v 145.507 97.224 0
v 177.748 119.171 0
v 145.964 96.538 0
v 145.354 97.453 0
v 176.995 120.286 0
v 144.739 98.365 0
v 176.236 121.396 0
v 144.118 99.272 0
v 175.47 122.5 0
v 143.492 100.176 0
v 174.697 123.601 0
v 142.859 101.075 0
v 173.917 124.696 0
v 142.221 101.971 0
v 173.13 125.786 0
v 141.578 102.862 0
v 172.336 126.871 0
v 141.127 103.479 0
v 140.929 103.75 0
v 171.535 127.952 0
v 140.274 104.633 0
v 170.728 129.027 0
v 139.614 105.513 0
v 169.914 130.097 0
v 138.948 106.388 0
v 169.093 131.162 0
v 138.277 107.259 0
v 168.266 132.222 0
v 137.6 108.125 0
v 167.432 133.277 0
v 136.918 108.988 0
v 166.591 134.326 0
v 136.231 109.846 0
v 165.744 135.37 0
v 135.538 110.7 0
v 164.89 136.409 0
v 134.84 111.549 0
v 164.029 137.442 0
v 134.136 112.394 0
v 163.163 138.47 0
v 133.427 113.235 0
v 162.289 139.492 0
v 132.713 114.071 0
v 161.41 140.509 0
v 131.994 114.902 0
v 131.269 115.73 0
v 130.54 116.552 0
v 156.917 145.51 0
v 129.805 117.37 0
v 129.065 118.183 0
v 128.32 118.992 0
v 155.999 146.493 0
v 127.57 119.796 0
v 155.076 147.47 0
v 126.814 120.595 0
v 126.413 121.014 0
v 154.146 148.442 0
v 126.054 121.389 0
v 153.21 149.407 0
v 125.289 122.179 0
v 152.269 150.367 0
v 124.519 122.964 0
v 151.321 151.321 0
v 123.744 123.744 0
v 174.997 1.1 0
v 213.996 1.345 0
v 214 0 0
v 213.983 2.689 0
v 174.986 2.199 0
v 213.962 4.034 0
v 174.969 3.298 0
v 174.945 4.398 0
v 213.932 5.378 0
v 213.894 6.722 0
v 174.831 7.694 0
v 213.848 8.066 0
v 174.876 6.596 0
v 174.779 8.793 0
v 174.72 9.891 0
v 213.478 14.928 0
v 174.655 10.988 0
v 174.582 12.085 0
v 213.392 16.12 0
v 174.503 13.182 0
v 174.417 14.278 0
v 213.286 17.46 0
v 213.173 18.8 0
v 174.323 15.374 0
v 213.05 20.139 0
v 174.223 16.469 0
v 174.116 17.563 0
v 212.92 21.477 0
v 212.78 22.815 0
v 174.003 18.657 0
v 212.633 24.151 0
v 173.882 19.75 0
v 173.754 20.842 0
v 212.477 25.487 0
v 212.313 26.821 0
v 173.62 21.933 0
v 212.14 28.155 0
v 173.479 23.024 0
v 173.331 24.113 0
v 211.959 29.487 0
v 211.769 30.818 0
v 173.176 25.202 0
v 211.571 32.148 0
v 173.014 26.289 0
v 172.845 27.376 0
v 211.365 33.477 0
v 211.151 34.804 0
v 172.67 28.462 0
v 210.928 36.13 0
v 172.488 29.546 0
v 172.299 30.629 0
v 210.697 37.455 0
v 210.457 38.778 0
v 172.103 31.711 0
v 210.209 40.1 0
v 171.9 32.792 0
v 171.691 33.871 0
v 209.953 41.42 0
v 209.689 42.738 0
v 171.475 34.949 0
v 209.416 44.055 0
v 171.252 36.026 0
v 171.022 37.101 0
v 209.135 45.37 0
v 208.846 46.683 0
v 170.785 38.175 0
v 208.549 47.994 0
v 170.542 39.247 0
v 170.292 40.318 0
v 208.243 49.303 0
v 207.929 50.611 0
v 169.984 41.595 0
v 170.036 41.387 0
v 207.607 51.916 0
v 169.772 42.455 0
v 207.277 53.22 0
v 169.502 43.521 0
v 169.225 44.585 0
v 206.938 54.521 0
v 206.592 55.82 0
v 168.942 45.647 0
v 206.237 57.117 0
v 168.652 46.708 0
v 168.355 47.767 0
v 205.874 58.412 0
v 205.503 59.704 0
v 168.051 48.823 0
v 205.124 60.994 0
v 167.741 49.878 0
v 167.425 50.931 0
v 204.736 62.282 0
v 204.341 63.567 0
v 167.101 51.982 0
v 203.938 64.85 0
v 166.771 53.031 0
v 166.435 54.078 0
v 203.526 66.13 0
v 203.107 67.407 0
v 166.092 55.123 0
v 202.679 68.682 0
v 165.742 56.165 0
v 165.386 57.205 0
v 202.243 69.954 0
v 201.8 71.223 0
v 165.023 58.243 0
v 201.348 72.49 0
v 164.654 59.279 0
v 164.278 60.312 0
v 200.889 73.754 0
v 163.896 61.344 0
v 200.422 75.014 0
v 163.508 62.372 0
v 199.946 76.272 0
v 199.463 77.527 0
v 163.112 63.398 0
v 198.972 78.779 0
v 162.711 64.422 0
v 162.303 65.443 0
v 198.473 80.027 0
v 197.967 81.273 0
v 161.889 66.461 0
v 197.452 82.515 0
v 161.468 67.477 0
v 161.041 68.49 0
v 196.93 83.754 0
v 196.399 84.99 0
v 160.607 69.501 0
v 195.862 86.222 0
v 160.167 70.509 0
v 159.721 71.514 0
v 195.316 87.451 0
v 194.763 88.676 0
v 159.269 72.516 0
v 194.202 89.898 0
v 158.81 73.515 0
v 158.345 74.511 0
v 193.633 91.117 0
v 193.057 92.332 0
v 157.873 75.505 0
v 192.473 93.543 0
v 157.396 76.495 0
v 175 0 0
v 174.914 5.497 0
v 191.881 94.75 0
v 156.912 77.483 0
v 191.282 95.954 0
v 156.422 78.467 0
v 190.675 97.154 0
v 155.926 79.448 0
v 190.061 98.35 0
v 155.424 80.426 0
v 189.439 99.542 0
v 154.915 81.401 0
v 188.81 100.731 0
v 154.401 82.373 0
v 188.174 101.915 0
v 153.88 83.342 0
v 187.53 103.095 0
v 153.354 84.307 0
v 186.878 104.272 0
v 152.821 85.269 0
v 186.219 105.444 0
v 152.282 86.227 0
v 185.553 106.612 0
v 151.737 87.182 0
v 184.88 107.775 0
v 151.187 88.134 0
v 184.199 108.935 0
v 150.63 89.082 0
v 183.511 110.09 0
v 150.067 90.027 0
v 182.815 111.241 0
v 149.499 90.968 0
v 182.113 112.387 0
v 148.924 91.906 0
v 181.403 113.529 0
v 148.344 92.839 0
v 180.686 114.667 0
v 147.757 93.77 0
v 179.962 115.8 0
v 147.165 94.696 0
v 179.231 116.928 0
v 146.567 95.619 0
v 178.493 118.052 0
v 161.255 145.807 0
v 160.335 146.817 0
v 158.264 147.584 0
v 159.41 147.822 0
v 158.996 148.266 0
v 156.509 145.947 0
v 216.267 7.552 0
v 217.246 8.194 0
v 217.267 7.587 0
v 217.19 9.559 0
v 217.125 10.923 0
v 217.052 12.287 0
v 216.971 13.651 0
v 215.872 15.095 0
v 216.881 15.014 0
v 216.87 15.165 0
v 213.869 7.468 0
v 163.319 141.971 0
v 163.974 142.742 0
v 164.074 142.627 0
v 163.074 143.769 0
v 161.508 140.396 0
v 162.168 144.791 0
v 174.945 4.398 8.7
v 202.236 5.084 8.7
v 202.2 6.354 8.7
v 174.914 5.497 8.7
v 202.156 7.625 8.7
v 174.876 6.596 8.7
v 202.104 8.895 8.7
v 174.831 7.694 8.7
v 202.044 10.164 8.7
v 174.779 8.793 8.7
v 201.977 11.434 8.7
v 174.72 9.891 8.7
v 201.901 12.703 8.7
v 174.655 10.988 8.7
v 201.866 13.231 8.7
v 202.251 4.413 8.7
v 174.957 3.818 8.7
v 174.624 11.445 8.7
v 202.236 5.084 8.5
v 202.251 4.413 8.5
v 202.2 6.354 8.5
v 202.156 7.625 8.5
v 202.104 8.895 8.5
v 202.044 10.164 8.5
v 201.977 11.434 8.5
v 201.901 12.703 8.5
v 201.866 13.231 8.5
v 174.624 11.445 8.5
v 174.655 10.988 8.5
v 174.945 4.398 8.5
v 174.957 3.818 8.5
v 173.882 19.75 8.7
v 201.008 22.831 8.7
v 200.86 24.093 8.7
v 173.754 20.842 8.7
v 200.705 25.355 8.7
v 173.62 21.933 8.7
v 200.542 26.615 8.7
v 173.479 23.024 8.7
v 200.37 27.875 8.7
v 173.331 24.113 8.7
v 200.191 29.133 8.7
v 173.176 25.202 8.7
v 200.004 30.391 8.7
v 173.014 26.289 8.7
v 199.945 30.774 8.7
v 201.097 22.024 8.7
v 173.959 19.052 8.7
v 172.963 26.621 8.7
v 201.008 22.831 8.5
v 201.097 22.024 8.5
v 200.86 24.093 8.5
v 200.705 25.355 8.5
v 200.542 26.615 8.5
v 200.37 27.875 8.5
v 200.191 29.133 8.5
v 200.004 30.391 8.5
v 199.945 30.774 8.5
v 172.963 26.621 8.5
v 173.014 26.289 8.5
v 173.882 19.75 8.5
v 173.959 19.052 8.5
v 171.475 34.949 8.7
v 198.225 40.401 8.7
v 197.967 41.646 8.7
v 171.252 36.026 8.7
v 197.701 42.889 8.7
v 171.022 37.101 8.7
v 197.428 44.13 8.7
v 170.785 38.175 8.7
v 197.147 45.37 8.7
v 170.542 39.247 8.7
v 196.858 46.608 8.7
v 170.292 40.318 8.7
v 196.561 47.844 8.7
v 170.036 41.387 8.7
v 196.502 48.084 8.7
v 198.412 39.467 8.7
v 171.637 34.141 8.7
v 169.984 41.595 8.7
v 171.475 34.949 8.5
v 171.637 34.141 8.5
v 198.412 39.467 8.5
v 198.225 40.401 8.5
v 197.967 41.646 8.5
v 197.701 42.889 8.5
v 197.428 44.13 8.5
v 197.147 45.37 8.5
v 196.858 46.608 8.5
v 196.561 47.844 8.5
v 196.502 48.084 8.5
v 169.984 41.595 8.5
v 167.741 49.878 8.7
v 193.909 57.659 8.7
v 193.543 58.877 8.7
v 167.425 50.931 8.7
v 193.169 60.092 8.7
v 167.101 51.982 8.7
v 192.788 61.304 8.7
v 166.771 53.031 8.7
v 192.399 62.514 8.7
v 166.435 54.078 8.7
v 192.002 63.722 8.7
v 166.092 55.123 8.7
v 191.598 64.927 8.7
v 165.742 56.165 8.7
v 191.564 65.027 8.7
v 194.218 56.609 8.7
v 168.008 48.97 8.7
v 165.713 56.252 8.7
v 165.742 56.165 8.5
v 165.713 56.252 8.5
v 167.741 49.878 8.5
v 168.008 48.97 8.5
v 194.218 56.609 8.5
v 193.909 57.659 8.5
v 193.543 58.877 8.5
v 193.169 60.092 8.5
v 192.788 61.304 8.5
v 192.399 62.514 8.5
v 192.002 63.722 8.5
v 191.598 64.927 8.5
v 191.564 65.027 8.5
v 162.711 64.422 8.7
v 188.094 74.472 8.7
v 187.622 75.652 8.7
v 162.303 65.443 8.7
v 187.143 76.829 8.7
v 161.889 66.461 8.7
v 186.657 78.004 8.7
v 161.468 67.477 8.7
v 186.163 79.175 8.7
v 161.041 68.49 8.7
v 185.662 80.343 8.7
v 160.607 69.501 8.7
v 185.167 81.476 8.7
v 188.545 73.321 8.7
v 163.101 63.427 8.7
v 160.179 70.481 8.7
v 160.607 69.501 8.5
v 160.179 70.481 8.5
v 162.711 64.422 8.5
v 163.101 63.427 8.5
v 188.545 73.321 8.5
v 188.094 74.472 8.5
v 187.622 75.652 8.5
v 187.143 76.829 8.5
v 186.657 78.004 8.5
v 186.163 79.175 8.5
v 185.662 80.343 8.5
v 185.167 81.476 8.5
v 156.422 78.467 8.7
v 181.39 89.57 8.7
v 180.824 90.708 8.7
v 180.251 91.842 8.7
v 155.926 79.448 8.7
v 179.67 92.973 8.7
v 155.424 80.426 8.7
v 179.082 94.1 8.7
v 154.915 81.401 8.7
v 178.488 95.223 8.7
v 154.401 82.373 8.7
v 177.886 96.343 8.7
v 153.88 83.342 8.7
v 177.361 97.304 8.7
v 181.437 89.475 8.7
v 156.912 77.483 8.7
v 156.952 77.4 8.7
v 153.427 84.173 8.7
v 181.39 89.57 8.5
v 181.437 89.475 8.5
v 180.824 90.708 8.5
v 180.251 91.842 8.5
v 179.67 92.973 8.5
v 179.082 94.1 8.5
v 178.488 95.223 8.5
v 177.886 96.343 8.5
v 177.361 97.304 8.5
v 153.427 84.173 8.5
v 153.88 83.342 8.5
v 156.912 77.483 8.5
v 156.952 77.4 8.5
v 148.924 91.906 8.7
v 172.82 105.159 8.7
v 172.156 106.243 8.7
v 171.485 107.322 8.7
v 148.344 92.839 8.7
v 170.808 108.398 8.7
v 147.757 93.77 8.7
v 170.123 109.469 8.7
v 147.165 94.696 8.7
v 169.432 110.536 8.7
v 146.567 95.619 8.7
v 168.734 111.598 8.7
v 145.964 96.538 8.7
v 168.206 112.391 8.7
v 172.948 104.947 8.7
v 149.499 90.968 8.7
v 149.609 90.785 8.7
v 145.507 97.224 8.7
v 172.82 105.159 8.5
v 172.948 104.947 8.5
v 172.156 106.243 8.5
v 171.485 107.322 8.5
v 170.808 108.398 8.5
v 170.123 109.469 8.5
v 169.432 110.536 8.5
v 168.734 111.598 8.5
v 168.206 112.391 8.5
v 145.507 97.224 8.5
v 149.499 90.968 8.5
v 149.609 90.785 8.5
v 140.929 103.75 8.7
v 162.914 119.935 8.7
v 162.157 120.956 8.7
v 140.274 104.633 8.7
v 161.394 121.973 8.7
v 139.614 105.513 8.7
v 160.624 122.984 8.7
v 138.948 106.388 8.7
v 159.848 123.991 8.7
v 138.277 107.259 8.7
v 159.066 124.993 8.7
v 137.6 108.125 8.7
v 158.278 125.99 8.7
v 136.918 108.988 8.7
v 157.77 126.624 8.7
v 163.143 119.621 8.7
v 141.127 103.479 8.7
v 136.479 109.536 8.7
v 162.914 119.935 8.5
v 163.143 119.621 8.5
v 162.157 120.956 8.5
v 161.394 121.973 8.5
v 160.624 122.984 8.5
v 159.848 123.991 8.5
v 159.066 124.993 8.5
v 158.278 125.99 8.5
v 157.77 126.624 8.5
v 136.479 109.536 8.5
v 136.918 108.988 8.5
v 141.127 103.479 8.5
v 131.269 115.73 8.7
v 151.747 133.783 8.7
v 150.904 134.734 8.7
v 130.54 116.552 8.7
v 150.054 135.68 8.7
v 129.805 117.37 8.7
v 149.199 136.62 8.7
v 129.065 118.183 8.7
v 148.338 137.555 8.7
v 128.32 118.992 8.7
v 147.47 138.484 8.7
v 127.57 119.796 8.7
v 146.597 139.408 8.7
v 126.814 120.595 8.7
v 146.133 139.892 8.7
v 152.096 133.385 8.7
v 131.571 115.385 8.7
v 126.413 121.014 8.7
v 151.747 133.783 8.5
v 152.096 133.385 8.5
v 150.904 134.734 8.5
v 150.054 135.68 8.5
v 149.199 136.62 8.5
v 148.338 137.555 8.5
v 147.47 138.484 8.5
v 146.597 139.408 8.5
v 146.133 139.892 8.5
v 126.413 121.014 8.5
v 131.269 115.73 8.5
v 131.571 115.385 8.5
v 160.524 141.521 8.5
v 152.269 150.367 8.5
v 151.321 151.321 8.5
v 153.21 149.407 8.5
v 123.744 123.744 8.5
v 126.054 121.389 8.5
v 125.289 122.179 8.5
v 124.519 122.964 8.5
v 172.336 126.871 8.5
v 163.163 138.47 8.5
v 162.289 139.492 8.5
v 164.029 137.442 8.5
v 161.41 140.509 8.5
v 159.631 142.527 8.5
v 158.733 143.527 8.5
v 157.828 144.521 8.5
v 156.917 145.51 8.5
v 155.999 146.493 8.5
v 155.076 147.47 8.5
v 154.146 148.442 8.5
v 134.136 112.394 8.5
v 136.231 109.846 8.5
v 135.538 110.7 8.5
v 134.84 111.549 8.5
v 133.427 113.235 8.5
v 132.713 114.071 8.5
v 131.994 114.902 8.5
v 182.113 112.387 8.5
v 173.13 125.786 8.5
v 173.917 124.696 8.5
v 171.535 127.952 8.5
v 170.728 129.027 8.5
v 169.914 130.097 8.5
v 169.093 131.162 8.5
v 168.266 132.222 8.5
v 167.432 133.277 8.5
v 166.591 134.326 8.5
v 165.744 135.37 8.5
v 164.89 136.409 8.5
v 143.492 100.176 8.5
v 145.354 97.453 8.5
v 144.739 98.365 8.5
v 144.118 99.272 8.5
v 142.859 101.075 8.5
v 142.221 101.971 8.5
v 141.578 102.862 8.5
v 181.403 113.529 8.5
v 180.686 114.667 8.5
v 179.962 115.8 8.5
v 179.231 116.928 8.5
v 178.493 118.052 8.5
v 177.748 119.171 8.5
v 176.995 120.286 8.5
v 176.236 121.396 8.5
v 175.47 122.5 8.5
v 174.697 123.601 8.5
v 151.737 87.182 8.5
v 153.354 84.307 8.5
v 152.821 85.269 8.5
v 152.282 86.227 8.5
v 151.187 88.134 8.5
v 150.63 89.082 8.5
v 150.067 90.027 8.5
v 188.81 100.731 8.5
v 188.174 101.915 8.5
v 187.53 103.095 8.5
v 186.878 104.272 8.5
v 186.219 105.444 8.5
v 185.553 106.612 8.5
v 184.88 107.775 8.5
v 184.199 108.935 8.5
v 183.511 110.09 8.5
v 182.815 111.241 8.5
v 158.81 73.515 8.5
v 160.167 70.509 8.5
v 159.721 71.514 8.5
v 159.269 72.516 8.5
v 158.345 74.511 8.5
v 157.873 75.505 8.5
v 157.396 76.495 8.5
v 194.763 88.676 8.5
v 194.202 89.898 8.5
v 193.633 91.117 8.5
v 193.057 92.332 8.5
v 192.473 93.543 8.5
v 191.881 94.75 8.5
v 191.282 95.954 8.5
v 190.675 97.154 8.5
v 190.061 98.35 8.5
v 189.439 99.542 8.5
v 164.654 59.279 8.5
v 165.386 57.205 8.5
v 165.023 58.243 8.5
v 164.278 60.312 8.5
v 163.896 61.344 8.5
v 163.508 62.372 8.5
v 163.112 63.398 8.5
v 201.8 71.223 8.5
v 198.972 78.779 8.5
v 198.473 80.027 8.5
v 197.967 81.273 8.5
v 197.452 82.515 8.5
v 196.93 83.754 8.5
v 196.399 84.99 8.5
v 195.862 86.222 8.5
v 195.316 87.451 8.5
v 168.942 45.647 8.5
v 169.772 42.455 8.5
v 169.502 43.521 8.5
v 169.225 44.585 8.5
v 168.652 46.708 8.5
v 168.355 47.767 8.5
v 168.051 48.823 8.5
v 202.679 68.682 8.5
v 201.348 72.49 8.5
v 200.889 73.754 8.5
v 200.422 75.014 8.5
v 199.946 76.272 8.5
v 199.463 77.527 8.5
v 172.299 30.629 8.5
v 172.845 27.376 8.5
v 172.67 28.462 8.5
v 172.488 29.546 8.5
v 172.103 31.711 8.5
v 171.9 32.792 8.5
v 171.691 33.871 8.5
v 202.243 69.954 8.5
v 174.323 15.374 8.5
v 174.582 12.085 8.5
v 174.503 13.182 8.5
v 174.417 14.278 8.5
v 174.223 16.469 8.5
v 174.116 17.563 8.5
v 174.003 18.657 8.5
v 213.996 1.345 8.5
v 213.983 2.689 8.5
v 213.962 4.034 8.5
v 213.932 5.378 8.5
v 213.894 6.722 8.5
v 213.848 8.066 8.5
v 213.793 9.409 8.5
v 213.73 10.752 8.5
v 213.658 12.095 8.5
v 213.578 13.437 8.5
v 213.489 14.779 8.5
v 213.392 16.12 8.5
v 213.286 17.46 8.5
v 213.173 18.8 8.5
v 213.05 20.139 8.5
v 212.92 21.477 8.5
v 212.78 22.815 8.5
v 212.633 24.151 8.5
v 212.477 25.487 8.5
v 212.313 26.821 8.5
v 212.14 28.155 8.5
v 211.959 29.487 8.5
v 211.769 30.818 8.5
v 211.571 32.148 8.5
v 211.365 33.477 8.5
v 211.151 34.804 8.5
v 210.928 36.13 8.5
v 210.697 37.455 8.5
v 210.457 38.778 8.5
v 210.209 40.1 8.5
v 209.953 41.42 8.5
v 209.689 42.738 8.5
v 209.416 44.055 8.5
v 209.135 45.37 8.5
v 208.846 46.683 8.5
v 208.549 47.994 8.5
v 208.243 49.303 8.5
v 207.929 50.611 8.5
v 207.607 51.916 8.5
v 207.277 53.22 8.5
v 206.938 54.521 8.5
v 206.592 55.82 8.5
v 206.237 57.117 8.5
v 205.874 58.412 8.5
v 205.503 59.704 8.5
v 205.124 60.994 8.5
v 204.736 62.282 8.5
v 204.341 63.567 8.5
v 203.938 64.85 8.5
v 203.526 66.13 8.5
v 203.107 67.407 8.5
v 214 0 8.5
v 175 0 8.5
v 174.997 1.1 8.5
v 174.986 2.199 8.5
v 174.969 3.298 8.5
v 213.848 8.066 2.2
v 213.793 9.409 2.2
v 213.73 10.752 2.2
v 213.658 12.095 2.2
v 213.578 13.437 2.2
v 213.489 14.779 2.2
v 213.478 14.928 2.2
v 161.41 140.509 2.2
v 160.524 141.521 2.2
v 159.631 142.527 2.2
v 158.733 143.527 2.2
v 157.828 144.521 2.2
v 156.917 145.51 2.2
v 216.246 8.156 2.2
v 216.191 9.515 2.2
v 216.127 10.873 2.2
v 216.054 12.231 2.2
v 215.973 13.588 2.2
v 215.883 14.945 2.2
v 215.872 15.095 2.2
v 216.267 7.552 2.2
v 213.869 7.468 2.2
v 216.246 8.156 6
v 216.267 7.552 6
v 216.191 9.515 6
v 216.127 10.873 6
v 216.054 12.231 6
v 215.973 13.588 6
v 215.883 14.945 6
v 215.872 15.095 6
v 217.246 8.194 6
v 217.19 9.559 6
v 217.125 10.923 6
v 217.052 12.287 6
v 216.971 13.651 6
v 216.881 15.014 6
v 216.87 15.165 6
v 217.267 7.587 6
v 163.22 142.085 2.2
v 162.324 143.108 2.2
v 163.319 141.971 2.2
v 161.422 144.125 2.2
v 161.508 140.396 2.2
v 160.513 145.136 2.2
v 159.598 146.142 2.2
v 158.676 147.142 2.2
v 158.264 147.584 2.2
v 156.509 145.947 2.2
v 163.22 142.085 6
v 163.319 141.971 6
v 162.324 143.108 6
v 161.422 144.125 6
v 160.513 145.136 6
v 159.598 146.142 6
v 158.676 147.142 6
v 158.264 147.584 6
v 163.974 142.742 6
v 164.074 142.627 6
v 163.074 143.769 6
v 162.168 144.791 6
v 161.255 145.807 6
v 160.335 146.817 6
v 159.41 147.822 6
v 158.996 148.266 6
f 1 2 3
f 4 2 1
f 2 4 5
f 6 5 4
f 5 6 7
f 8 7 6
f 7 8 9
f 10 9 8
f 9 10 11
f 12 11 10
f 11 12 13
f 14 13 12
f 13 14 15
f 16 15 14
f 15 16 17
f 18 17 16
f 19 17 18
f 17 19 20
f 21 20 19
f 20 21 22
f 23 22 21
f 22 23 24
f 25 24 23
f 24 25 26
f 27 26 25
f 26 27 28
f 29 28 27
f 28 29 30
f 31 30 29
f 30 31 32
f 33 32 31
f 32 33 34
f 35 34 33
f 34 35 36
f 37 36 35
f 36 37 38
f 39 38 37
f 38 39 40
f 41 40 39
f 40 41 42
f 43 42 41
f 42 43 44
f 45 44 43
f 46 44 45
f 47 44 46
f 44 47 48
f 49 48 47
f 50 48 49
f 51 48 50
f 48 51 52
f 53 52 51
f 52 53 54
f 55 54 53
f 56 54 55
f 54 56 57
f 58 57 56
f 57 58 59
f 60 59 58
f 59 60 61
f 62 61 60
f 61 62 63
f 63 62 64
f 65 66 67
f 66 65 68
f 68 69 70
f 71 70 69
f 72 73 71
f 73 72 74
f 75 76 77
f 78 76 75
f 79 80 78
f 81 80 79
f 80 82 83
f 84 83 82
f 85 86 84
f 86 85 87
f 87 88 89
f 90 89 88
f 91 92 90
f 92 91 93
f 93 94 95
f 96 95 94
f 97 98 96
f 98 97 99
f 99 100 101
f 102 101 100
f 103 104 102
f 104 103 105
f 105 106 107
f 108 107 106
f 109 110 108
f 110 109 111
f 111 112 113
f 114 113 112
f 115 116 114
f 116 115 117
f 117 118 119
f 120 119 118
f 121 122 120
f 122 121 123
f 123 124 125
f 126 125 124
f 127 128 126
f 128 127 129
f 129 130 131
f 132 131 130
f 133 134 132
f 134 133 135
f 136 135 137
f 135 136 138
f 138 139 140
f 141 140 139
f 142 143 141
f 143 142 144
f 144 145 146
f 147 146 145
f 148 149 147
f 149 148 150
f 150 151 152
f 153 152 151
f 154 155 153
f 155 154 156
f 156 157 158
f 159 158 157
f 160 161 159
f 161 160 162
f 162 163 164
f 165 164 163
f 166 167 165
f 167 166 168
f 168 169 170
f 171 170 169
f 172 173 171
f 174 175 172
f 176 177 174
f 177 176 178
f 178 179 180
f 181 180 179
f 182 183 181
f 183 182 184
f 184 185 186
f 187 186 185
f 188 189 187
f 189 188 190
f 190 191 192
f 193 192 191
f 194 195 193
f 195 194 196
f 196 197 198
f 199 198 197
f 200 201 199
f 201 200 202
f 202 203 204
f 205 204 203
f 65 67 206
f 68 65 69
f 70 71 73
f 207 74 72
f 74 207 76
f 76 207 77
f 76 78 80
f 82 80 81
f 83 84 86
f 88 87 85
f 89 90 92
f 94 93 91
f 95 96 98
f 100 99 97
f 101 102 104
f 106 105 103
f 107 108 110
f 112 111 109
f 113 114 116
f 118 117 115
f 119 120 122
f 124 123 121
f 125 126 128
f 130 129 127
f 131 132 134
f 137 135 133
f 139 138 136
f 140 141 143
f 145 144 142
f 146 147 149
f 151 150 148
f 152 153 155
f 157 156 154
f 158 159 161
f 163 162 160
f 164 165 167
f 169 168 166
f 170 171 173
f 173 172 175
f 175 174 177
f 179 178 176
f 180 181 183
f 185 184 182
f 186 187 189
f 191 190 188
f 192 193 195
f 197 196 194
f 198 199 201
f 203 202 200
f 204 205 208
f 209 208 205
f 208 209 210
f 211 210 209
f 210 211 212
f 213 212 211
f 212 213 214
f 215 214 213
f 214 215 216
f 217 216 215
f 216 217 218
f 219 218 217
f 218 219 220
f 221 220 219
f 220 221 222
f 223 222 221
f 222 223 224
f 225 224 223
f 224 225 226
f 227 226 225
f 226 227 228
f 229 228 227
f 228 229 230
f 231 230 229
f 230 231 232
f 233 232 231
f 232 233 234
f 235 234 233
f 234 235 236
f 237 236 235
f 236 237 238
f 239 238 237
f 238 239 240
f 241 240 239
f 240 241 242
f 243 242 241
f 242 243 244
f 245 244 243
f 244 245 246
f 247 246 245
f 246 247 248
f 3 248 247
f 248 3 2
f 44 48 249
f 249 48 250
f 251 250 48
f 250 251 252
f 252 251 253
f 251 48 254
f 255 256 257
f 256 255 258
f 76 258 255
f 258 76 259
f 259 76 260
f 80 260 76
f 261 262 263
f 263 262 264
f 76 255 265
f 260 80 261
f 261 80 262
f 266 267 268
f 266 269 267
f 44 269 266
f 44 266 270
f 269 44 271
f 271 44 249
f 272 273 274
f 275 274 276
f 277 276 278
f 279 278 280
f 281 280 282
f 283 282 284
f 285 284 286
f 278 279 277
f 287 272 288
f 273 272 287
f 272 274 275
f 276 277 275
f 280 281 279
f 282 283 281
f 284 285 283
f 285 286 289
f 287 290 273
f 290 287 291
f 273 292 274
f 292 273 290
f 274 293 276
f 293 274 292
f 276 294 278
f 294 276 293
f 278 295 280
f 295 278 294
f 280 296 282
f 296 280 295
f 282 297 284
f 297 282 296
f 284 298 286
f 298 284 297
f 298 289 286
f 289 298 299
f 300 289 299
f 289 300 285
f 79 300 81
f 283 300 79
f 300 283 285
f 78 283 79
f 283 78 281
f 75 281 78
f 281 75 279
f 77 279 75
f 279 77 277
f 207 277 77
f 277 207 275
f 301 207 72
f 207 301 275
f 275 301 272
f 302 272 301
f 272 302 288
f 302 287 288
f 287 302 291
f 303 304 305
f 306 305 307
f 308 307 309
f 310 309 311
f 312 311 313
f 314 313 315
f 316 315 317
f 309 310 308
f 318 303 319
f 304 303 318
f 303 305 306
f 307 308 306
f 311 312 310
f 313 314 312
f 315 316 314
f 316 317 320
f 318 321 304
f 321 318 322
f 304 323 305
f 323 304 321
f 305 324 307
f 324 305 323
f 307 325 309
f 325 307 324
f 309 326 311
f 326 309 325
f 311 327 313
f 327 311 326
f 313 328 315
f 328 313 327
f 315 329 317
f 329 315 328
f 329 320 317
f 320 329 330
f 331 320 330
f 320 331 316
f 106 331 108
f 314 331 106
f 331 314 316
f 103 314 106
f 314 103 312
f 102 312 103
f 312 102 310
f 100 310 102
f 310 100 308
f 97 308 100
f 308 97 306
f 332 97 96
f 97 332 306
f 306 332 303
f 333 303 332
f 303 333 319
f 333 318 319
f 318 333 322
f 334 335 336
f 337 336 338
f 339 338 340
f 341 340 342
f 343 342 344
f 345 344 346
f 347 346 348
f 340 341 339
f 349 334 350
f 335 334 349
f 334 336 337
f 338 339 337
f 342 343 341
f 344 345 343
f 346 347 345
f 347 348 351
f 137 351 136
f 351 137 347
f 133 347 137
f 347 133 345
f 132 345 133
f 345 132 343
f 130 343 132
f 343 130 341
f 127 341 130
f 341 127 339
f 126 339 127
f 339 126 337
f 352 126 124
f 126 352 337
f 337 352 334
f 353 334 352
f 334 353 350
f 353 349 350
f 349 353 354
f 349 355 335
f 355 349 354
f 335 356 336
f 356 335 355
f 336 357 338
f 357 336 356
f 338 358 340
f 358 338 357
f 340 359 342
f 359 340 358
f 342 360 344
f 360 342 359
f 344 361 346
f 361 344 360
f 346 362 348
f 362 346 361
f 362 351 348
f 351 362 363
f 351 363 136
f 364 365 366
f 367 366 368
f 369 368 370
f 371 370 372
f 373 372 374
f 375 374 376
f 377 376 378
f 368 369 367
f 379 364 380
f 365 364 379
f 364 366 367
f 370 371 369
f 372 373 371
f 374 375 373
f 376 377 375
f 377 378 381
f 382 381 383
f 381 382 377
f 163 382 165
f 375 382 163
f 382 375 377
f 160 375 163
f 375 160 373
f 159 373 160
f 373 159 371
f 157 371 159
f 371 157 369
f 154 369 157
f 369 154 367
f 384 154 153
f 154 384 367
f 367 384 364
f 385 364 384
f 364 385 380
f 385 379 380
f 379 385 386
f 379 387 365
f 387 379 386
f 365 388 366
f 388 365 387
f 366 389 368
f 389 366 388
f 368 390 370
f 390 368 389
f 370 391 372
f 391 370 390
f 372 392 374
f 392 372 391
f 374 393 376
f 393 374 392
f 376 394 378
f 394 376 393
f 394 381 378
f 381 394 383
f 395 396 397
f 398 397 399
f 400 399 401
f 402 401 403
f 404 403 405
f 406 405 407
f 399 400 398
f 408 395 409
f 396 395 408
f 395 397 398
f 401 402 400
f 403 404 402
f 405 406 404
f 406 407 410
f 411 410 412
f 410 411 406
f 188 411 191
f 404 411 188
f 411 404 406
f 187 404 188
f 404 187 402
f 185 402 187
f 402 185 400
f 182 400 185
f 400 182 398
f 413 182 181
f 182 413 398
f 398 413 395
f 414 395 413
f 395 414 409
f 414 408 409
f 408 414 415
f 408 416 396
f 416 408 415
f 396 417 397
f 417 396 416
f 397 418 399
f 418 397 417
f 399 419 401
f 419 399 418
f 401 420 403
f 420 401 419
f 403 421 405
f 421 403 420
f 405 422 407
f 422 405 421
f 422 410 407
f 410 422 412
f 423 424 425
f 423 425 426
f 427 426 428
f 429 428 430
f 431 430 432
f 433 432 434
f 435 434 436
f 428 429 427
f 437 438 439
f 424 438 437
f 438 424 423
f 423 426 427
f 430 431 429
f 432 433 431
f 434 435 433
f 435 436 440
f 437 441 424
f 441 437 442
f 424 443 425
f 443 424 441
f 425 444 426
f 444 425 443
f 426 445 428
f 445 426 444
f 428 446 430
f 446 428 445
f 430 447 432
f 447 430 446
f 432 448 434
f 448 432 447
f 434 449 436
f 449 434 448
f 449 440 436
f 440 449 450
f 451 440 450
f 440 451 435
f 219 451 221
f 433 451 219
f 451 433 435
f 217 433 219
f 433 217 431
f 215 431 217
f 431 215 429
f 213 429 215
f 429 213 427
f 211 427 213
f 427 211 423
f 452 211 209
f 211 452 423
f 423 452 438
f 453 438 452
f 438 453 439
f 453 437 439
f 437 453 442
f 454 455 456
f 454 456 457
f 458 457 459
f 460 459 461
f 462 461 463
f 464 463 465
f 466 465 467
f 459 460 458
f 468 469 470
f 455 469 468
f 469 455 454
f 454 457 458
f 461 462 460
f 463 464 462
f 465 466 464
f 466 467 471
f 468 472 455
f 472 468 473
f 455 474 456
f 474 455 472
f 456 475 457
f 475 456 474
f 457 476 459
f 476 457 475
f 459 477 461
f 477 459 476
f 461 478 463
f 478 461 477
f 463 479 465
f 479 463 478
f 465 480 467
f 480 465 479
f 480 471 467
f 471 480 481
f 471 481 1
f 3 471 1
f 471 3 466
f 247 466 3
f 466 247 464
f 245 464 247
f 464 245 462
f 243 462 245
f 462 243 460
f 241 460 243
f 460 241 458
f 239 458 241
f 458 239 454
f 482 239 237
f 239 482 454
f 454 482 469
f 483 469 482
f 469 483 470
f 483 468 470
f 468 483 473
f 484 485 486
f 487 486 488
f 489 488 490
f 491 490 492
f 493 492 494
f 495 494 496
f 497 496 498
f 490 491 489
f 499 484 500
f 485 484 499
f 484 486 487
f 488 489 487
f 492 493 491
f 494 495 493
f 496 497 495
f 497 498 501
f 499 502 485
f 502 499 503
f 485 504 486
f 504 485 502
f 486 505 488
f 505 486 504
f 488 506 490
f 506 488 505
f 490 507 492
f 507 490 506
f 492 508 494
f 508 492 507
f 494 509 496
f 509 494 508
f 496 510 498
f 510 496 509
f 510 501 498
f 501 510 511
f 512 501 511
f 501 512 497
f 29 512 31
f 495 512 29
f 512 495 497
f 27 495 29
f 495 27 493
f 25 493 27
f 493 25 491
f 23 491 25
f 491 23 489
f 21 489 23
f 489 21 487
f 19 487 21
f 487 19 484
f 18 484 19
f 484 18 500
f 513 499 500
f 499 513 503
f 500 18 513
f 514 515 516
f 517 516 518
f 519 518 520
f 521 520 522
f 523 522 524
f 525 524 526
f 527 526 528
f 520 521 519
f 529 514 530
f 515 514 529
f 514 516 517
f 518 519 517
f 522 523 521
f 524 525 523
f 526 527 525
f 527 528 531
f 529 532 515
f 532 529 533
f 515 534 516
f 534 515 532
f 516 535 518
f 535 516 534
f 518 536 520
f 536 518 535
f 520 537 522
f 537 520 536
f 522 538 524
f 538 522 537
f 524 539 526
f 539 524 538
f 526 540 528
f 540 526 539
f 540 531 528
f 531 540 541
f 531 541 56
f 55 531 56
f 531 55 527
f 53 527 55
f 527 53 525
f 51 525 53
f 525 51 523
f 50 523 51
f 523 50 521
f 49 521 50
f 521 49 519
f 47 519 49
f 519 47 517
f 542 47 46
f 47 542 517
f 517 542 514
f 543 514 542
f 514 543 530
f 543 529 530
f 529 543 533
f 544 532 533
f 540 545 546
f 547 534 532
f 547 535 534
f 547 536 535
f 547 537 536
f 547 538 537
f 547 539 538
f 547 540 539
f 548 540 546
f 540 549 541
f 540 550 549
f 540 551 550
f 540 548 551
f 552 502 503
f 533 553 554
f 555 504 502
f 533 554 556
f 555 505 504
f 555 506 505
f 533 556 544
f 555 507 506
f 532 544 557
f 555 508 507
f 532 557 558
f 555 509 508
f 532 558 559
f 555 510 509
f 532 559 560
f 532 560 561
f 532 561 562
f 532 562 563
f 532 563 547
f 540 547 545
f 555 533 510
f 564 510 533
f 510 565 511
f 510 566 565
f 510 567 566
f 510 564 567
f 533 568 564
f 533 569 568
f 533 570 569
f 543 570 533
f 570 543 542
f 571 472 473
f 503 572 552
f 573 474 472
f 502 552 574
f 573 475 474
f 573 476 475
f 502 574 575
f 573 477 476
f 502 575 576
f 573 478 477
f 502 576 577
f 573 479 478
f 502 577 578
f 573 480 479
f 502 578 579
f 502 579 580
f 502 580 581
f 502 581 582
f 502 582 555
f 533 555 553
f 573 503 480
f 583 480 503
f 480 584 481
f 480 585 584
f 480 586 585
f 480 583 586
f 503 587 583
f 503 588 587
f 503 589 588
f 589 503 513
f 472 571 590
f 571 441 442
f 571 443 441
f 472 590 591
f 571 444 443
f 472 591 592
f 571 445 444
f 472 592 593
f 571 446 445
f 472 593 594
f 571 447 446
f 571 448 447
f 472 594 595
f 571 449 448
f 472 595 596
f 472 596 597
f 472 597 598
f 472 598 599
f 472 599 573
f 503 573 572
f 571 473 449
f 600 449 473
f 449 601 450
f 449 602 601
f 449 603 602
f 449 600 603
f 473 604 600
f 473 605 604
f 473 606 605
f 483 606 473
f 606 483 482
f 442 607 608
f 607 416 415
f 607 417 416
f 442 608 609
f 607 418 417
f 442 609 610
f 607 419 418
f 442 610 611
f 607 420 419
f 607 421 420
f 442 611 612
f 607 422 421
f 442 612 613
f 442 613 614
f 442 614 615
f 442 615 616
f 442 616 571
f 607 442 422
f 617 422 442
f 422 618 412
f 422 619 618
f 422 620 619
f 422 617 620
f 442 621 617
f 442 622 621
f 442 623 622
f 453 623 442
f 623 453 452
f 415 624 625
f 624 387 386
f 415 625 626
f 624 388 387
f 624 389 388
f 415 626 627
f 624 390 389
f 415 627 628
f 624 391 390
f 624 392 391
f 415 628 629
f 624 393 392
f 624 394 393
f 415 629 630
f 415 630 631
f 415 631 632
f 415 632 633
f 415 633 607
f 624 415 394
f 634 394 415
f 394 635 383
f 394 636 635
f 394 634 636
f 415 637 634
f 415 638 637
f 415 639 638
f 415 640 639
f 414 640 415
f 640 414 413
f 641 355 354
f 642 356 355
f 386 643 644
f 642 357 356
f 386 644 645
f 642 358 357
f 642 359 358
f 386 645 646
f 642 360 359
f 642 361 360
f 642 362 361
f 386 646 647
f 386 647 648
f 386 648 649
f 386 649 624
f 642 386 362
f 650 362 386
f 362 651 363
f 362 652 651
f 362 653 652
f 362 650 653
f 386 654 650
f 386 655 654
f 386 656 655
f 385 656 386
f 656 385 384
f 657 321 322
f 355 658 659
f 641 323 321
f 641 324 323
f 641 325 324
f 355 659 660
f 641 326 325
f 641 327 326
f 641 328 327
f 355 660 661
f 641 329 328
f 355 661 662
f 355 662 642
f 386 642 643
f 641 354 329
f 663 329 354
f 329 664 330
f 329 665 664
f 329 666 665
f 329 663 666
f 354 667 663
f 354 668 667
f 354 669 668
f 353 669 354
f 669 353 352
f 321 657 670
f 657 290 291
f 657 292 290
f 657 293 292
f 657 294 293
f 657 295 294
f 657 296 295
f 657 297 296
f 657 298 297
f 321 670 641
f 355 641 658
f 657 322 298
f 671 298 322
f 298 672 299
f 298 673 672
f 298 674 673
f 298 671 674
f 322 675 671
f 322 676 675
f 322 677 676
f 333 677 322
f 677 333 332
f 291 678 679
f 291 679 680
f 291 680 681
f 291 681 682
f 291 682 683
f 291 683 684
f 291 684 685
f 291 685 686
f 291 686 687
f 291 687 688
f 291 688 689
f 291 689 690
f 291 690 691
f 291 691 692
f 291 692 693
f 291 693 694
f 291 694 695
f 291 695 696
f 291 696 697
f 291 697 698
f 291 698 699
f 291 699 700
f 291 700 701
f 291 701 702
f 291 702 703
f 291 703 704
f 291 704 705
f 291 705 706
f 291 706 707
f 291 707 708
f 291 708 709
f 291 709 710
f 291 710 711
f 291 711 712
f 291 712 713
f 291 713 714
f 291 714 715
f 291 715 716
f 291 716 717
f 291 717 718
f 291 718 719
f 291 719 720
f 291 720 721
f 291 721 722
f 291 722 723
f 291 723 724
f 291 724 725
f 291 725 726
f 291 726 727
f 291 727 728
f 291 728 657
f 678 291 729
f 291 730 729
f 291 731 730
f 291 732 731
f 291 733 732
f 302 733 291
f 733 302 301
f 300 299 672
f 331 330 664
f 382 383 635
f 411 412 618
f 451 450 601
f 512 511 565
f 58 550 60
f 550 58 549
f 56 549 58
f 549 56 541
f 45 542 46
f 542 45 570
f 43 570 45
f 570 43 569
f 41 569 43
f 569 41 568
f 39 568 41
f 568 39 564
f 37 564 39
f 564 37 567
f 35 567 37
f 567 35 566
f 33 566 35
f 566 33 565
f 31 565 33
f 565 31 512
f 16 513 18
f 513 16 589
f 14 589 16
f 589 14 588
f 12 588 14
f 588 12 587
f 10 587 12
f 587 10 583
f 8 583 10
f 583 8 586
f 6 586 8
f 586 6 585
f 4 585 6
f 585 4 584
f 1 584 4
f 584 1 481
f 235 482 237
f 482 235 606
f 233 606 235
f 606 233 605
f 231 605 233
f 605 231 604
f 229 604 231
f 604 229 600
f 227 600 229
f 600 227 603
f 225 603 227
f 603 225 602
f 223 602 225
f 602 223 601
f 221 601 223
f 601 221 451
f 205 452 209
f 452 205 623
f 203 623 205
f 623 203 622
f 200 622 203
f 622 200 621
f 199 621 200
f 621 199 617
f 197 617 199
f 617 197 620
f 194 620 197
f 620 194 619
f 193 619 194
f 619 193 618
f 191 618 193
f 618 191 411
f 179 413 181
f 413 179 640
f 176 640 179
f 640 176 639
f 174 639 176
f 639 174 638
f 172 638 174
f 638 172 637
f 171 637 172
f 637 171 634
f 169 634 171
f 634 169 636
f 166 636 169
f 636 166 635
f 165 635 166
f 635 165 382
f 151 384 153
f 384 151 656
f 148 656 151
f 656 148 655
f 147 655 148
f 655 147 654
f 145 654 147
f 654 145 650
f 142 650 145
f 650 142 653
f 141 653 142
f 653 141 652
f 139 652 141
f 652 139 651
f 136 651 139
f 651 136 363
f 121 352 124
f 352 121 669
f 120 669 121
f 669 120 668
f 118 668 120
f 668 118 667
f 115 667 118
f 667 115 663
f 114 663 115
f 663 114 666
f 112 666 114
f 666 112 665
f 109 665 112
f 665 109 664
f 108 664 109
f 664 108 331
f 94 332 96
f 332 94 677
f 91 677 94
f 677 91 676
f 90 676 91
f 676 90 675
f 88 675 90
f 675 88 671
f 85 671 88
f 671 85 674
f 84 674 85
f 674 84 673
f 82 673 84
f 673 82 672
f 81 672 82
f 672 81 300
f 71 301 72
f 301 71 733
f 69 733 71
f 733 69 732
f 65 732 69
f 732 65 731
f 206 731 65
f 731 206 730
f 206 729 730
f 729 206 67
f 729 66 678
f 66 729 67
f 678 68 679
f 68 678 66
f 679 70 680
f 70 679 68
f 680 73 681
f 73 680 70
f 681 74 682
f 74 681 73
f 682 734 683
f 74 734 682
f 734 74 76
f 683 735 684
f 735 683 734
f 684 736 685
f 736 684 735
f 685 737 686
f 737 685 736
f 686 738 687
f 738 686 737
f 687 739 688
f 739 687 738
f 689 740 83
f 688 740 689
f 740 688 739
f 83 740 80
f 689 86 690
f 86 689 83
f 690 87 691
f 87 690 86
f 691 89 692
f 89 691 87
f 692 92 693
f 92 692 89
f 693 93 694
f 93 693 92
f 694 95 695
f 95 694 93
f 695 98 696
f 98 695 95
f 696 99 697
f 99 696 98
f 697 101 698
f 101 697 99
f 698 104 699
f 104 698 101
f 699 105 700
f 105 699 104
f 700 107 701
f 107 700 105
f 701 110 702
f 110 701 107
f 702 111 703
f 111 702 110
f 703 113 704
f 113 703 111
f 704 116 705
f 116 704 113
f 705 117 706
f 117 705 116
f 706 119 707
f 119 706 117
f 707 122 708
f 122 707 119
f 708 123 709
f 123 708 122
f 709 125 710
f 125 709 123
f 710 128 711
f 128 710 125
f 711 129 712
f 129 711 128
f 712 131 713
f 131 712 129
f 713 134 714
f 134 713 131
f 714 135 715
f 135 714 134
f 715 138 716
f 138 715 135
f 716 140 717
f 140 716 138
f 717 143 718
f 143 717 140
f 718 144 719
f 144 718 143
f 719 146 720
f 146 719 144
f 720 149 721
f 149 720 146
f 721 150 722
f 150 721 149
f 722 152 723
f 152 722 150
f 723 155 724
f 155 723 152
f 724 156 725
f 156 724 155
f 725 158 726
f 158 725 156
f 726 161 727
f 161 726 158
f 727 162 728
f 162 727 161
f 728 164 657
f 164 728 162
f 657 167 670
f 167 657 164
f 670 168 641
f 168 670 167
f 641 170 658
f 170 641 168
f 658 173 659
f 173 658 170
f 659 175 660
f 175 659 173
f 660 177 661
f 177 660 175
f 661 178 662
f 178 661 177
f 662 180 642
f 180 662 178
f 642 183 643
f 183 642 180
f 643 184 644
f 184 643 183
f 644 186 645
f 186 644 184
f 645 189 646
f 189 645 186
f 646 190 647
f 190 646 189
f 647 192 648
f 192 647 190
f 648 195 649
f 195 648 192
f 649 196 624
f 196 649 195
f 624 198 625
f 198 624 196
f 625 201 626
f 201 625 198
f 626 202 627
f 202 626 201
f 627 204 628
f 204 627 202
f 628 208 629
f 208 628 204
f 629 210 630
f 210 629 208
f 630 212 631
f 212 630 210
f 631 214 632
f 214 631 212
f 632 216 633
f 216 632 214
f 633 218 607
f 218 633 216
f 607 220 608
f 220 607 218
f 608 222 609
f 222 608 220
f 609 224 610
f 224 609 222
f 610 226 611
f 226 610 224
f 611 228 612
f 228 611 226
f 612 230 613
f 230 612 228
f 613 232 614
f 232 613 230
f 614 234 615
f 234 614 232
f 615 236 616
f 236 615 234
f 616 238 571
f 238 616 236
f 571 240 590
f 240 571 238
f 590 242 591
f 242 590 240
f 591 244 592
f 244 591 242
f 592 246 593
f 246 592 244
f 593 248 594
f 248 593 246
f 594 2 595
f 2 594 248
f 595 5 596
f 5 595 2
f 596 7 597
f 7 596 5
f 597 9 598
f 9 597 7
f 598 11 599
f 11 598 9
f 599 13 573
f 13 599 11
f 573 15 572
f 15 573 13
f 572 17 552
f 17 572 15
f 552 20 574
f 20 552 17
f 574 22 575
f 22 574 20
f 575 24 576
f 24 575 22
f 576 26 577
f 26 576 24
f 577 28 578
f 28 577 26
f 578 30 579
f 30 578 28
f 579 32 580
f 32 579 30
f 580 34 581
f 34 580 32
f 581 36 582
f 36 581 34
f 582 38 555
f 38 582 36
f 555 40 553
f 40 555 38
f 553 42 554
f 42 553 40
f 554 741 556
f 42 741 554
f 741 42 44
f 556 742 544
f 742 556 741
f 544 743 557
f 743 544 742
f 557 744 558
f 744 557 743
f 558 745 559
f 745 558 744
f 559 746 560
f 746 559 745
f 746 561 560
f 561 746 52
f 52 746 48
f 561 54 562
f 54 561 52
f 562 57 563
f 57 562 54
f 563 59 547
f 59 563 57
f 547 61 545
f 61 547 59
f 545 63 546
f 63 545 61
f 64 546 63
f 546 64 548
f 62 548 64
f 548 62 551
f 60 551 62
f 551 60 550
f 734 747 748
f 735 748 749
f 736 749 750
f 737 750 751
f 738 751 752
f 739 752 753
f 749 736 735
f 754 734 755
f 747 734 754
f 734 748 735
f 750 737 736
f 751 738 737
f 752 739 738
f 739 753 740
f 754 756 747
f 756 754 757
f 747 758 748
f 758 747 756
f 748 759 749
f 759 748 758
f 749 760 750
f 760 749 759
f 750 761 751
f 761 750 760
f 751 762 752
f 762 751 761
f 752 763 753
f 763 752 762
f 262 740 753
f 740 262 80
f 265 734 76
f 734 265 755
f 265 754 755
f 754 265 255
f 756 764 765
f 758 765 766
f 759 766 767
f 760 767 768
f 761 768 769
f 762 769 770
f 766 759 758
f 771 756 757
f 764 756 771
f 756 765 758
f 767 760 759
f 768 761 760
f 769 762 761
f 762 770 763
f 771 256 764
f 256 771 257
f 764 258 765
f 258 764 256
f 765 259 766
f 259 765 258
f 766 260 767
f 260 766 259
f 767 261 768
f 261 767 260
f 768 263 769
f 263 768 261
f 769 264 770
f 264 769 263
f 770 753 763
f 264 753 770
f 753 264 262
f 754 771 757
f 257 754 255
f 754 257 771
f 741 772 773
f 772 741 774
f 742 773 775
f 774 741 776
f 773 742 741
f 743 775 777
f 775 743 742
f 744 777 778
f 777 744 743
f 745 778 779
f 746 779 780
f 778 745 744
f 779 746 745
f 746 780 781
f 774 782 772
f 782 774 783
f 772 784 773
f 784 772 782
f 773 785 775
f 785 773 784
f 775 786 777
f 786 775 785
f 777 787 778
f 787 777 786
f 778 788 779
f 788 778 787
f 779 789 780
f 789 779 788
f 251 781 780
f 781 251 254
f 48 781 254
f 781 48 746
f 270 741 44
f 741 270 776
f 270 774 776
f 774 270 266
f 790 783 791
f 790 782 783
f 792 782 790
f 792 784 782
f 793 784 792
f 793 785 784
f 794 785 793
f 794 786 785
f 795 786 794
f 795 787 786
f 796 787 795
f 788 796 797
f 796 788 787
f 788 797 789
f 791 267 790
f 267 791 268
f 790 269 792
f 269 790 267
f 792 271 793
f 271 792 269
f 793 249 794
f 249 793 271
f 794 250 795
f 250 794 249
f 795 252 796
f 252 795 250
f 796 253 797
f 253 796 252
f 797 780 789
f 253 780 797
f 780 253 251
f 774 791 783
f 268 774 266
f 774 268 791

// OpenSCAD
// file: 3d_arc.scad
// https://openhome.cc/eGossip/OpenSCAD/SectorArc.html

module sector(radius, begin, end, fn) {
    r = radius / cos(180 / fn);
    step = -360 / fn;

    points = concat([[0, 0]],
        [for(a = [begin : step : end - 360]) 
            [r * cos(a), r * sin(a)]
        ],
        [[r * cos(end), r * sin(end)]]
    );

    difference() {
        circle(radius, $fn = fn); // cilinder
        polygon(points);
    }
}

module arc(radius, begin, end, width, fn) {
    difference() {
        sector(radius + width, begin, end, fn);
        sector(radius, begin, end, fn);
    }
} 


module 3d_arc(height, radius, width, begin, end, fn) {
    linear_extrude(height) arc(radius, begin, end, width, fn);
}
// main file
// https://openhome.cc/eGossip/OpenSCAD/SectorArc.html

// width is the angle
// lenght is distance from the center of the circunference
// height is the thinkness

include <3d_arc.scad>

fn = 1000;

// kerb

kerb_radius = 214; // mm
kerb_length = 39; // mm
kerb_height = 8.5; // mm
kerb_width = 45; // deg

3d_arc(kerb_height, kerb_radius - kerb_length, kerb_length, 0, kerb_width, fn);

// hooks

hook_offset = 2; // deg
hook_width = 2; // deg
hook_bend_height = 2.2; // mm
hook_bend_lentgh = 2.4; // mm
hook_barb_height = 6; // mm
hook_barb_lentgh = 1; // mm

3d_arc(hook_bend_height, kerb_radius, hook_bend_lentgh, hook_offset, hook_offset + hook_width, fn);
3d_arc(hook_barb_height, kerb_radius + hook_bend_lentgh, hook_barb_lentgh, hook_offset, hook_offset + hook_width, fn);

3d_arc(hook_bend_height, kerb_radius, hook_bend_lentgh, kerb_width - hook_offset, kerb_width - hook_offset - hook_width, fn);
3d_arc(hook_barb_height, kerb_radius + hook_bend_lentgh, hook_barb_lentgh, kerb_width - hook_offset, kerb_width - hook_offset - hook_width, fn);

// strips

strip_count = 9; // #
strip_width = 0.5; // %
strip_length = 0.7; // %
strip_height = 0.2; // mm

strip_angle = kerb_width / strip_count;

for(i = [0 : strip_count - 1]) {
    strip_offset = i * strip_angle;
    strip_center = strip_offset + strip_angle / 2;
    begin = strip_center - strip_width * strip_angle / 2;
    end = strip_center + strip_width * strip_angle / 2;

    3d_arc(kerb_height + strip_height, kerb_radius - kerb_length, strip_length * kerb_length, begin, end, fn);
}
